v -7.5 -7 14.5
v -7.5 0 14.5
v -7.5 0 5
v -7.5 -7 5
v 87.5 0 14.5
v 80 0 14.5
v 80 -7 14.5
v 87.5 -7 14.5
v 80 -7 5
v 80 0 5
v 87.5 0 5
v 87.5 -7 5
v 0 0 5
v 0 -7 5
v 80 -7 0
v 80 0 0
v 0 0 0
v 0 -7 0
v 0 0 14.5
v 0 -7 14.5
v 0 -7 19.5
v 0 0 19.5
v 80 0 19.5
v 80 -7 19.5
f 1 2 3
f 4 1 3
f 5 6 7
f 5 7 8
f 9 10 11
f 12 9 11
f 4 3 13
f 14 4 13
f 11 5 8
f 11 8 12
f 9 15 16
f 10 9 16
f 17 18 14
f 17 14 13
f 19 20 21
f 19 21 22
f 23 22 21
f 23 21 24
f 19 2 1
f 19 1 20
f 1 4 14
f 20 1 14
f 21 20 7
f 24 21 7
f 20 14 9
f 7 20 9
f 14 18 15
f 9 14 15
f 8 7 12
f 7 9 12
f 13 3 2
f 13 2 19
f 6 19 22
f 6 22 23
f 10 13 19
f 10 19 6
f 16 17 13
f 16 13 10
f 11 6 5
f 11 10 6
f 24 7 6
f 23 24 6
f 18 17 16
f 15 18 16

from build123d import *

# Parameters (mm, degrees)
SKETCH2_W           = 80
SKETCH2_H           = 7
BOSS_EXTRUDE1_DEPTH = 19.5
SKETCH3_W           = 7.5
SKETCH3_H           = 9.5
BOSS_EXTRUDE2_DEPTH = 7


with BuildPart() as part:
    # Sketch2 → Boss-Extrude1 (new body)
    with BuildSketch(Plane.XY):
        with Locations((40, -3.5)):
            Rectangle(SKETCH2_W, SKETCH2_H)
    extrude(amount=BOSS_EXTRUDE1_DEPTH)

    # Sketch3 → Boss-Extrude2 (add)
    with BuildSketch(Plane(origin=(0, 0, 0), x_dir=(1, 0, 0), z_dir=(0, 1, 0))):
        with Locations((-3.75, -9.75)):
            Rectangle(SKETCH3_W, SKETCH3_H)
        with Locations((83.75, -9.75)):
            Rectangle(SKETCH3_W, SKETCH3_H)
    extrude(amount=-BOSS_EXTRUDE2_DEPTH)


solid = part.part
